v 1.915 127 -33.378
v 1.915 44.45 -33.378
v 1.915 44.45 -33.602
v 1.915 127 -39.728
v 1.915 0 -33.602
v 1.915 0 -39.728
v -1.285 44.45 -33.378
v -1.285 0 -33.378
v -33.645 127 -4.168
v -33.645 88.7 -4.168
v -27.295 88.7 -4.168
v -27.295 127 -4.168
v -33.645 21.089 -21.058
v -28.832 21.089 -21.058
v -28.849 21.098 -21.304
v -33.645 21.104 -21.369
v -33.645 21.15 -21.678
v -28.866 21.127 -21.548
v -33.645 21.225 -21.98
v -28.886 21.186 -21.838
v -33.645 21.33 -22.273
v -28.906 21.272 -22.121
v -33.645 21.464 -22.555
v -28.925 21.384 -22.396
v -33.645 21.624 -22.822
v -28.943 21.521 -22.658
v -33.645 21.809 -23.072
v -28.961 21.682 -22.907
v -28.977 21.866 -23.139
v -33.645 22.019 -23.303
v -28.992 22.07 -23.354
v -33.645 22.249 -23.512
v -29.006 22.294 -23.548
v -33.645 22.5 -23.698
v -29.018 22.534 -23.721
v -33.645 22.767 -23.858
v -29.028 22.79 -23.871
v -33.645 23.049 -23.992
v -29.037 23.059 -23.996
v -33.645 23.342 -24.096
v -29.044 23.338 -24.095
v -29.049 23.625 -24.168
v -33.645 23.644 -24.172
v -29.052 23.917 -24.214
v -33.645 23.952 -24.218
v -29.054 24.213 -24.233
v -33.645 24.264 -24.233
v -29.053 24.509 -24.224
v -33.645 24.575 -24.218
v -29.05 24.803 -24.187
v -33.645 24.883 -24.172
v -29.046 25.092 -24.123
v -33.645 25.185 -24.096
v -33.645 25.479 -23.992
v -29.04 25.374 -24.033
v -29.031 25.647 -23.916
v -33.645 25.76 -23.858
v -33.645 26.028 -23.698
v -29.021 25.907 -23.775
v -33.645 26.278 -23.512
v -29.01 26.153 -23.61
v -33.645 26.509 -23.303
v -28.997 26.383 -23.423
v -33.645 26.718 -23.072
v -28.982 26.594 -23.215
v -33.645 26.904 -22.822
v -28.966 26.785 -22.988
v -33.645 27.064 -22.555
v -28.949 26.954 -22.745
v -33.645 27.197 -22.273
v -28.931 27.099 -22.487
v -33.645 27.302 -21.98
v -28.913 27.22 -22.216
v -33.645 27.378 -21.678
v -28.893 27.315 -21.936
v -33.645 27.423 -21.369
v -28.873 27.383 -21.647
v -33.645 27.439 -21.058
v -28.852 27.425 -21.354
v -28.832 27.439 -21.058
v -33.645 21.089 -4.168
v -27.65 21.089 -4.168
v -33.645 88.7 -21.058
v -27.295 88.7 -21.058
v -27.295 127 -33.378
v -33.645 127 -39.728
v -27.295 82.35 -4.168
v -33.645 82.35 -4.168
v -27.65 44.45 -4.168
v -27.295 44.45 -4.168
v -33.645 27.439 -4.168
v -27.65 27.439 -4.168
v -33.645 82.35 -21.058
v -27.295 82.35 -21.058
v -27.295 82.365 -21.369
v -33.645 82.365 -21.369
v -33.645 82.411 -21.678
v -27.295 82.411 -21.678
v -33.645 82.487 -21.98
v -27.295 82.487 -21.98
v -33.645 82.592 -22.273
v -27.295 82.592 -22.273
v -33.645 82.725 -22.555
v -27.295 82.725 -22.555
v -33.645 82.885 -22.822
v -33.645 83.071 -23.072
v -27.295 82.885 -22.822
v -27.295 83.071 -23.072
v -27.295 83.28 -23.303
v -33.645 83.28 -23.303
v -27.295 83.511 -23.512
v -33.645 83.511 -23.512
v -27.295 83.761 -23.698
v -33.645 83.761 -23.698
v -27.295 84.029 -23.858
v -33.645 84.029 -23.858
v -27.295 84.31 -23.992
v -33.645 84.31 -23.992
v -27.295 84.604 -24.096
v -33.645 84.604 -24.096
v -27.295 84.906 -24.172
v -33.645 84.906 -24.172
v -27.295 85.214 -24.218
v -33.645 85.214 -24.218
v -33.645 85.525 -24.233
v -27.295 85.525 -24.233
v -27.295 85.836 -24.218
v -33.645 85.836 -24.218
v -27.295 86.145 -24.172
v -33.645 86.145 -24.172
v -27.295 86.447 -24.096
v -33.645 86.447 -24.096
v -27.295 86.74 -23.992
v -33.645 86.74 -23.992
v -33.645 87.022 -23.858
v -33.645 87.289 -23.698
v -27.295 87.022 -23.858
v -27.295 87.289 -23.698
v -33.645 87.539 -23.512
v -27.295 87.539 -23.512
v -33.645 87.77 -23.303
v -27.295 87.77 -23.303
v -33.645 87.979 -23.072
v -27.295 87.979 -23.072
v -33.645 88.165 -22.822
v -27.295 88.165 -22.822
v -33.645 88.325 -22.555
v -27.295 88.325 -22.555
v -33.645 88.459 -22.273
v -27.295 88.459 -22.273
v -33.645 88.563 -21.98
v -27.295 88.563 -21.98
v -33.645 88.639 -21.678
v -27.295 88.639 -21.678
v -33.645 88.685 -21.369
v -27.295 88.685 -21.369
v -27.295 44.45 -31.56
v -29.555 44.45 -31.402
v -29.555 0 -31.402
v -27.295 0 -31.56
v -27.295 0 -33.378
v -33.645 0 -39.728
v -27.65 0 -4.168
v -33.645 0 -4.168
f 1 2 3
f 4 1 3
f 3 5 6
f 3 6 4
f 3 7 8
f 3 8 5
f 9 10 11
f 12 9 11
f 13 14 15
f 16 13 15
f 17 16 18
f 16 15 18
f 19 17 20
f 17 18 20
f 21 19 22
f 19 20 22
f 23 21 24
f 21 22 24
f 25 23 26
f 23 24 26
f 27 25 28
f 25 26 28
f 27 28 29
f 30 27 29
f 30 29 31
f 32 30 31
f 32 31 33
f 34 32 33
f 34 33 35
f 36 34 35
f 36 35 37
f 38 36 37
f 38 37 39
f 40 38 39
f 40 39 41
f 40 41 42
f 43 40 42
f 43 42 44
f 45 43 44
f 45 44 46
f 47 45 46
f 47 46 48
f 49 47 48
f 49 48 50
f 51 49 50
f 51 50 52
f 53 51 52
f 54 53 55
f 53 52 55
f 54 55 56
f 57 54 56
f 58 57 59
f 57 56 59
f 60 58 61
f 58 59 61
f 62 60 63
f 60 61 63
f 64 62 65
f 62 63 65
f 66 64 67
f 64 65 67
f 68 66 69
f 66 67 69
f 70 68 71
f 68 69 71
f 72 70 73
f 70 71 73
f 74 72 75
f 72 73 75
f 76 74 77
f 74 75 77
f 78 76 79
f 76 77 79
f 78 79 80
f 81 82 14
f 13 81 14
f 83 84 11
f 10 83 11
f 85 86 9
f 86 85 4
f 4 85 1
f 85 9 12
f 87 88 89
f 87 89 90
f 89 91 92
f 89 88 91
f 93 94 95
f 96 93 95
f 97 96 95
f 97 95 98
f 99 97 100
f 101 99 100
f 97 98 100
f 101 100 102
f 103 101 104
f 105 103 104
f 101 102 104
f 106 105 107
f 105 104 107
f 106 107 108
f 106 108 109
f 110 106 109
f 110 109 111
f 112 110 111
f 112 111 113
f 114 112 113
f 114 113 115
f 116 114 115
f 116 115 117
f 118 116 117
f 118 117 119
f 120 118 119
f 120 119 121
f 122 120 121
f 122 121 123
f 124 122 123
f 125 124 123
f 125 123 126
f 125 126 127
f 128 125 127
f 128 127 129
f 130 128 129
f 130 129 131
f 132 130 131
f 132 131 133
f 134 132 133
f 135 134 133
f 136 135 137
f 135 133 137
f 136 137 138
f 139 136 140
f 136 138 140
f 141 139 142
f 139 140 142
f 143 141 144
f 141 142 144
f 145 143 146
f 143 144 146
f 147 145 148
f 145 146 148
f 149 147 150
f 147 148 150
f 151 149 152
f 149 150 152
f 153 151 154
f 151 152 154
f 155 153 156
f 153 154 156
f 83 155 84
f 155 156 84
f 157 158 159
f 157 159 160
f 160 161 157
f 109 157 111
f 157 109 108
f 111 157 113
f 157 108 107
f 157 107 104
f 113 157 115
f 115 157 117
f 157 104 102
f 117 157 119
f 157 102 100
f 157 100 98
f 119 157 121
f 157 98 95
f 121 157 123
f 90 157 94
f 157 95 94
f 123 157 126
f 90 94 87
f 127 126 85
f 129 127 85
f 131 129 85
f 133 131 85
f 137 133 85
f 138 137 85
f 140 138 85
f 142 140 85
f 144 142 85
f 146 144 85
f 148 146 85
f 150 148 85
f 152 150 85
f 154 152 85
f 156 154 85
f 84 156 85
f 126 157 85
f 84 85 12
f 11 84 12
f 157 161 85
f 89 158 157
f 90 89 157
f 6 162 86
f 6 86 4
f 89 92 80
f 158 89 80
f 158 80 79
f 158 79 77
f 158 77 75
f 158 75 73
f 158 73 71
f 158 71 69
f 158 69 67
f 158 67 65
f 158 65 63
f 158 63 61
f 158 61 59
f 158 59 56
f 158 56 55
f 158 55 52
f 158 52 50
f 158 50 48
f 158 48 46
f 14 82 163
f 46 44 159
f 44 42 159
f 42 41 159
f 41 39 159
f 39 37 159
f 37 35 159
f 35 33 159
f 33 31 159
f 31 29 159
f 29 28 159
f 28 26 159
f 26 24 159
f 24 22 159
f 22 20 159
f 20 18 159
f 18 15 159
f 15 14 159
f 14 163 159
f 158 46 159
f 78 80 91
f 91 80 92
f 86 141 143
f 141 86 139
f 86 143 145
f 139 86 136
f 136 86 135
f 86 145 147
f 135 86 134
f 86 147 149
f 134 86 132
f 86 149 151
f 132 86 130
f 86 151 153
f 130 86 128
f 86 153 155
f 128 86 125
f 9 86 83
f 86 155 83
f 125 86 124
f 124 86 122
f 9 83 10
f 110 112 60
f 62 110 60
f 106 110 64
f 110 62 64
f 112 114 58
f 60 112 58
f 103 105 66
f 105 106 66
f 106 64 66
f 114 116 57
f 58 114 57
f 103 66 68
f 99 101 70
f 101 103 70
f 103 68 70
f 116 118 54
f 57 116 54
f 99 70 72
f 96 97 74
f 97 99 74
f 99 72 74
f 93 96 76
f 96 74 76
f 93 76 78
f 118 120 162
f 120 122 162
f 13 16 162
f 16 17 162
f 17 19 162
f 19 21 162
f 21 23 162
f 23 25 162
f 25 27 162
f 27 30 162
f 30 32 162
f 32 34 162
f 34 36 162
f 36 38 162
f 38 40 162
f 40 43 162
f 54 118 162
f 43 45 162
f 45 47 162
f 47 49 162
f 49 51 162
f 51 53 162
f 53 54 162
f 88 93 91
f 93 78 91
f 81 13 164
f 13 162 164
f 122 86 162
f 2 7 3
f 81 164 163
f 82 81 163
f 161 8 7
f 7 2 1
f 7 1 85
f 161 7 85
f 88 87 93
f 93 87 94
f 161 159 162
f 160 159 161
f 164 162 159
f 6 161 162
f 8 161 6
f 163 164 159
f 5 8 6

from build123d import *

# Parameters (mm, degrees)
F0_W     = 64.7085476667
F0_H     = 64.7085476667
F1_DEPTH = 127
F2_W     = 58.3585476667
F2_H     = 58.3585476667
F3_DEPTH = 127.001
F5_DEPTH = 44.45
F6_W     = 6.35
F6_H     = 24.0614805496
F7_DEPTH = 6.351
F9_DEPTH = 127.001


# Not quite as in the source:
# - a feature names something its author has since deleted; it is built from what else it names


with BuildPart() as f1:
    # F0 (on Front) → F1 (new body)
    with BuildSketch(Plane.XZ):
        with Locations((-1.2904843315, -7.374192588)):
            Rectangle(F0_W, F0_H)
    extrude(amount=-F1_DEPTH)

    # F2 (on face) → F3 (cut, through all)
    with BuildSketch(Plane(origin=(0, 127, 0), x_dir=(-1, 0, 0), z_dir=(0, 1, 0))):
        with Locations((-1.8845156685, -4.199192588)):
            Rectangle(F2_W, F2_H)
    extrude(amount=-F3_DEPTH, mode=Mode.SUBTRACT)

    # F4 (on face) → F5 (cut)
    with BuildSketch(Plane.XZ):
        Polygon((-27.2947581649, -31.5596693708), (-27.2947581649, 0.9186006957), (-29.554808952, -31.4016312239), align=None)
        Polygon((31.0637895018, -33.3784664214), (-1.2847486443, -33.3784664214), (31.0637895018, -35.6404965727), align=None)
    extrude(amount=-F5_DEPTH, mode=Mode.SUBTRACT)

    # F6 (on face) → F7 (cut, through all)
    with BuildSketch(Plane.YZ.offset(-27.2947581649)):
        with Locations((24.2636220248, 12.9493409705)):
            Rectangle(F6_W, F6_H)
        with BuildLine():
            Line((27.4386220248, -21.0581904151), (27.4386220248, 0.9186006957))
            Line((27.4386220248, 0.9186006957), (21.0886220248, 0.9186006957))
            Line((21.0886220248, 0.9186006957), (21.0886220248, -21.0581904151))
            ThreePointArc((21.0886220248, -21.0581904151), (24.2636220248, -24.2331904151), (27.4386220248, -21.0581904151))
        make_face()
        with BuildLine():
            Line((88.7001905876, 24.9800812453), (82.3501905876, 24.9800812453))
            Line((82.3501905876, 24.9800812453), (82.3501905876, -21.0581904151))
            ThreePointArc((82.3501905876, -21.0581904151), (85.5251905876, -24.2331904151), (88.7001905876, -21.0581904151))
            Line((88.7001905876, -21.0581904151), (88.7001905876, 24.9800812453))
        make_face()
    extrude(amount=-F7_DEPTH, mode=Mode.SUBTRACT)

    # F8 (on face) → F9 (cut, through all)
    with BuildSketch(Plane.XZ):
        Polygon((-27.2947581649, 0.9186006957), (-27.6504805517, -4.1684664214), (1.9152418351, -4.1684664214), (1.9152418351, 31.3519202173), (-33.6447581649, 31.3519202173), (-33.6447581649, 24.9800812453), (-27.2947581649, 24.9800812453), align=None)
        Polygon((-33.6447581649, 24.9800812453), (-33.6447581649, -4.1684664214), (-27.6504805517, -4.1684664214), (-27.2947581649, 0.9186006957), (-27.2947581649, 24.9800812453), align=None)
        Polygon((1.9152418351, -33.6022315546), (1.9152418351, -39.7284664214), (31.0637895018, -39.7284664214), (31.0637895018, -35.6404965727), align=None)
        Polygon((1.9152418351, -4.1684664214), (1.9152418351, -33.6022315546), (31.0637895018, -35.6404965727), (31.0637895018, 31.3519202173), (1.9152418351, 31.3519202173), align=None)
    extrude(amount=-F9_DEPTH, mode=Mode.SUBTRACT)


solid = f1.part
